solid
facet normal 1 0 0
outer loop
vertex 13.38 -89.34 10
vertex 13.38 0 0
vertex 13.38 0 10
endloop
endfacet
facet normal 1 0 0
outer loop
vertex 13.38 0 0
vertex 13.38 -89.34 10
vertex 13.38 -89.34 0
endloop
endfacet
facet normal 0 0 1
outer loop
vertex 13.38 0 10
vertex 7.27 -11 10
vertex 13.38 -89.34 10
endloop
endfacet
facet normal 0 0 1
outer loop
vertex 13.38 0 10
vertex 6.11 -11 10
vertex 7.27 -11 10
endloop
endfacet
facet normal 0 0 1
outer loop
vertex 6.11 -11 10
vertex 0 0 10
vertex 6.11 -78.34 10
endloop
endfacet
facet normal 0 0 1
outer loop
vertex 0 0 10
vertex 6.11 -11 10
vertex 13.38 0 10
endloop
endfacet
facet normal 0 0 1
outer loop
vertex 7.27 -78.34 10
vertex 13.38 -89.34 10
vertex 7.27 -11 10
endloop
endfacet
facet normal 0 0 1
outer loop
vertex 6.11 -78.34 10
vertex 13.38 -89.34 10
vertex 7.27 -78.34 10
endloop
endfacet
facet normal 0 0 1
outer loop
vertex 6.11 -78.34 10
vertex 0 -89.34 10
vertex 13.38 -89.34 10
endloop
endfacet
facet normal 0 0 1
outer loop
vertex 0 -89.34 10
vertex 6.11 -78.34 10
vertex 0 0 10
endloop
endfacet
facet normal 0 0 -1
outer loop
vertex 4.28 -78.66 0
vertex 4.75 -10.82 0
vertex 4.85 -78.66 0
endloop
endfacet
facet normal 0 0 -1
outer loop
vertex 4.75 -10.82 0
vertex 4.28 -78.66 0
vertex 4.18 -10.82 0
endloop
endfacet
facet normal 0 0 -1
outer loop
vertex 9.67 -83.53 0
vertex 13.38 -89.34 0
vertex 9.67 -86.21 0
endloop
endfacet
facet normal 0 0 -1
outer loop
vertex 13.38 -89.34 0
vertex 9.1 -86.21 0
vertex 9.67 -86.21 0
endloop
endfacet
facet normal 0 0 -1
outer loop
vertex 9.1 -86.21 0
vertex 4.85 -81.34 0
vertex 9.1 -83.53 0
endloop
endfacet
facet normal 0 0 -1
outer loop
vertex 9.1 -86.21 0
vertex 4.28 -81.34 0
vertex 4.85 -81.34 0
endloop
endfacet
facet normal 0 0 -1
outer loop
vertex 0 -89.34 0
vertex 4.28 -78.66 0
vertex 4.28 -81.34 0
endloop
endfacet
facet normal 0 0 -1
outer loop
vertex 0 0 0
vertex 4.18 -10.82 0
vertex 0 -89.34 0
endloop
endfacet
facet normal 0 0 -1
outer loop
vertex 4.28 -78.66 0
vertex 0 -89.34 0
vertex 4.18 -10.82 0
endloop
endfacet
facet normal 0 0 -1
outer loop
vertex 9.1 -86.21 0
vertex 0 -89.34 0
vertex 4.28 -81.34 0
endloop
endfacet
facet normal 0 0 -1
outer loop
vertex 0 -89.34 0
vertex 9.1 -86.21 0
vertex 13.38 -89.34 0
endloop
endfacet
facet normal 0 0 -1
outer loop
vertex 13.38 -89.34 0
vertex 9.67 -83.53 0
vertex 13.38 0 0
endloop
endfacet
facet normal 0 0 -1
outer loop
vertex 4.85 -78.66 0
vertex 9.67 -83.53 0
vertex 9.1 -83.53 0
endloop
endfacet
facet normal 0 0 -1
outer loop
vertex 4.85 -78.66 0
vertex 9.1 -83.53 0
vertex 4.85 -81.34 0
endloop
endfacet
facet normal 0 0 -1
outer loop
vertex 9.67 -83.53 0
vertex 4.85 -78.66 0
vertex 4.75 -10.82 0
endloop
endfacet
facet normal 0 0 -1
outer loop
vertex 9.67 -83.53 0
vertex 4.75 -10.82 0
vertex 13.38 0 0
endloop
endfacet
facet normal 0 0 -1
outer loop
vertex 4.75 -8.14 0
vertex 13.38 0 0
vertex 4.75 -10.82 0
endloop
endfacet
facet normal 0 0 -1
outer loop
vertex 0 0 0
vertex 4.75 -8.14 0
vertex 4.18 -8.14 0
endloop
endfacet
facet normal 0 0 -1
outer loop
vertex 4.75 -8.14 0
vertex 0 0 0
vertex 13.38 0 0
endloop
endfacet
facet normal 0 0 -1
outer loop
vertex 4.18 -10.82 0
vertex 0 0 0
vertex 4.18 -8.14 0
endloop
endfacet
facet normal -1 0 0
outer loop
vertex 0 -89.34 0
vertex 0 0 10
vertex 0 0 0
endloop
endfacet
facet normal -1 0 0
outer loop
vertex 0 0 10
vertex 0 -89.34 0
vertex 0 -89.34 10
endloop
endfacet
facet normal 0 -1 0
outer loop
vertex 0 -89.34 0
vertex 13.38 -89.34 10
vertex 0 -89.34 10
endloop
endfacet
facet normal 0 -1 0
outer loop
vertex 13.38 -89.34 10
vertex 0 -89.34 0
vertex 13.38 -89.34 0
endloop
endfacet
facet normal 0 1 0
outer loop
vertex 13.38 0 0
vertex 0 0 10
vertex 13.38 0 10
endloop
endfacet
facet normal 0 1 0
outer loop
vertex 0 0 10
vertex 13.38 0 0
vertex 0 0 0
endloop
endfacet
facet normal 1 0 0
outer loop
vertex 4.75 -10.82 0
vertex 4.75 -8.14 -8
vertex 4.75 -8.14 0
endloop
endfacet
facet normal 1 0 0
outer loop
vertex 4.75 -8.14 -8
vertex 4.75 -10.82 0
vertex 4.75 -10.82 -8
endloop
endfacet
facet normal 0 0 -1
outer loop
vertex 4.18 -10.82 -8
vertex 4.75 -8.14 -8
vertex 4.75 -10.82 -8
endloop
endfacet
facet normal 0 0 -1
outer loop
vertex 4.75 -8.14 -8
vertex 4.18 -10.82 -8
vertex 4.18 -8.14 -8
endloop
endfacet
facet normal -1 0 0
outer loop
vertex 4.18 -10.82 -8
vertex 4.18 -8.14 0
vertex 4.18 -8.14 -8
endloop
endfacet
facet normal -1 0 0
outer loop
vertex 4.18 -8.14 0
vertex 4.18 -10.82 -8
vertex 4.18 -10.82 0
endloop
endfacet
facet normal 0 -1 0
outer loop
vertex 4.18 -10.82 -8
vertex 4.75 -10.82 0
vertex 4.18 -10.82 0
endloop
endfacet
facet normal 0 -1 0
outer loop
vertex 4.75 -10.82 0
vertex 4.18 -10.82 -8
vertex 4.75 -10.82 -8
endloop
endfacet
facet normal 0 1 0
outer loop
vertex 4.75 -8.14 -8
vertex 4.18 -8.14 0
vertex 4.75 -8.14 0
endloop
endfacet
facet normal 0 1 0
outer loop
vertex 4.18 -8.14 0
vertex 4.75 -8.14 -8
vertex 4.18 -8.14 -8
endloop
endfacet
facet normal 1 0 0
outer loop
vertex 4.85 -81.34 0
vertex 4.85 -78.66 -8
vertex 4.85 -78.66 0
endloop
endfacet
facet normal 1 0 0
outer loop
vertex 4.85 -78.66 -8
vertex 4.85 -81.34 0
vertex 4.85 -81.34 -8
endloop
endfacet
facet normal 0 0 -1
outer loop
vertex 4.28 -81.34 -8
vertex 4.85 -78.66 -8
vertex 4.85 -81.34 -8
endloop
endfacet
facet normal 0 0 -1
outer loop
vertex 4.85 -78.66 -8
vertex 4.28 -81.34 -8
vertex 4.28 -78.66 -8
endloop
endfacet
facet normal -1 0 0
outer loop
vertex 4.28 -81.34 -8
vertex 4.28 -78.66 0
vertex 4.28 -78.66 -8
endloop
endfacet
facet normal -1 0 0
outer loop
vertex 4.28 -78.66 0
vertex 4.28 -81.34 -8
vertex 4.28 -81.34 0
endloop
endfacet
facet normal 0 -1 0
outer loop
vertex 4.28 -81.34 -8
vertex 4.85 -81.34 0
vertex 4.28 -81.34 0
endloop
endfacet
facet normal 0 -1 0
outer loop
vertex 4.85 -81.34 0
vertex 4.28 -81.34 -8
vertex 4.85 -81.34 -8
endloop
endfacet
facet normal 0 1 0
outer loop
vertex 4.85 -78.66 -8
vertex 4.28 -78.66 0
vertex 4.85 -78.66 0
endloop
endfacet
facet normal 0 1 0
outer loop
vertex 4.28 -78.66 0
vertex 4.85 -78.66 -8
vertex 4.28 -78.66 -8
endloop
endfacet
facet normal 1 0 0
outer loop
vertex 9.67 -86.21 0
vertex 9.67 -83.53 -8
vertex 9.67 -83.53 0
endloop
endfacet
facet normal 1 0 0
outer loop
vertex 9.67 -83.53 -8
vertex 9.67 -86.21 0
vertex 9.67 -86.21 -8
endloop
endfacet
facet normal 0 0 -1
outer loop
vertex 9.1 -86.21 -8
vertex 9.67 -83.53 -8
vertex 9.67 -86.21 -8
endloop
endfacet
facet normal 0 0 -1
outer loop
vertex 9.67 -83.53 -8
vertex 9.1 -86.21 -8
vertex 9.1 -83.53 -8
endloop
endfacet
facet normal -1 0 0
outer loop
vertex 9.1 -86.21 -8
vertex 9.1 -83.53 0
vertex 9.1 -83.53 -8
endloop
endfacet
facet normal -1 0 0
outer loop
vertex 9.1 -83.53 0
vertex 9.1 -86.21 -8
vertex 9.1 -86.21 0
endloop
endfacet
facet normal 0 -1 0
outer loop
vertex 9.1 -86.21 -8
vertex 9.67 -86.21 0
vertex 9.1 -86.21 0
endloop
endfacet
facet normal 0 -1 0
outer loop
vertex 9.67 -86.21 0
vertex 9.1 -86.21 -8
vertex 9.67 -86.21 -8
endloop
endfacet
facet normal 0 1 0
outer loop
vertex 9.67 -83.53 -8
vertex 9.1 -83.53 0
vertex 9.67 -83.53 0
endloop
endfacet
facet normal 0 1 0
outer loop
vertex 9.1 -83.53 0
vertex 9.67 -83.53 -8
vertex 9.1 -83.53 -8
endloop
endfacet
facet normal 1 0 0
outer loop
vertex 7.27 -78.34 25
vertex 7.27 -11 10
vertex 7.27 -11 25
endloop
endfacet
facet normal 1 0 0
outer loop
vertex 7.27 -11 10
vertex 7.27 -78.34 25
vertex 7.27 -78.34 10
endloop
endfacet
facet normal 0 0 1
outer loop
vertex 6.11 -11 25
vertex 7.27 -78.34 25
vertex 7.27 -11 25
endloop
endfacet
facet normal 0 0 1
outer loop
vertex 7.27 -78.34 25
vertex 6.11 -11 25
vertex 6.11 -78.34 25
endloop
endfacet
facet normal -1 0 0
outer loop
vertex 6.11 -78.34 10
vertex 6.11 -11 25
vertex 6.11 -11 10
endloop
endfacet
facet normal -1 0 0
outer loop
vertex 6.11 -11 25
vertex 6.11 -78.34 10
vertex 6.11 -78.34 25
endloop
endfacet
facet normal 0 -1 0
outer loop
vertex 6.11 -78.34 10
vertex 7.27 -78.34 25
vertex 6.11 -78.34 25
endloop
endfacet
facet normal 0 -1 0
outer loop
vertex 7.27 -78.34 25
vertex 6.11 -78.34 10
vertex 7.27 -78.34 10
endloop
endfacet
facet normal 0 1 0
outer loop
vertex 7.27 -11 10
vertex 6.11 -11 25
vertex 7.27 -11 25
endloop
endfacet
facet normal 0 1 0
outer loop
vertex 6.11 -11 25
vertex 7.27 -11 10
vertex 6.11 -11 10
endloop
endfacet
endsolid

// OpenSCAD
// unit = millimeter

bodySizeX = 13.38;
bodySizeY = 89.34;
bodySizeZ = 10;

//invert Y axis to match KiCad coordinate system
scale([1, -1, 1]){
    union(){

        //body
        cube([bodySizeX, bodySizeY, bodySizeZ]);

        // pins
        pinSizeX = 0.57;
        pinSizeY = 2.68;
        pinSizeZ = 8;
        translate([4.18, 8.14, -pinSizeZ]) {
            cube([pinSizeX, pinSizeY, pinSizeZ]);
        }

        translate([4.28, 78.66, -pinSizeZ]) {
            cube([pinSizeX, pinSizeY, pinSizeZ]);
        }

        translate([9.1, 83.53, -pinSizeZ]) {
            cube([pinSizeX, pinSizeY, pinSizeZ]);
        }

        // handle
        handleSizeX = 1.16;
        handleYDistanceFromEdge = 11;
        handleSizeY = (bodySizeY - (handleYDistanceFromEdge*2));
        handleSizeZ = 15;
        translate([
                (bodySizeX-handleSizeX)/2,
                (bodySizeY-handleSizeY)/2,
                bodySizeZ
            ]){
            cube([handleSizeX, handleSizeY, handleSizeZ]);
        }
    }
}
